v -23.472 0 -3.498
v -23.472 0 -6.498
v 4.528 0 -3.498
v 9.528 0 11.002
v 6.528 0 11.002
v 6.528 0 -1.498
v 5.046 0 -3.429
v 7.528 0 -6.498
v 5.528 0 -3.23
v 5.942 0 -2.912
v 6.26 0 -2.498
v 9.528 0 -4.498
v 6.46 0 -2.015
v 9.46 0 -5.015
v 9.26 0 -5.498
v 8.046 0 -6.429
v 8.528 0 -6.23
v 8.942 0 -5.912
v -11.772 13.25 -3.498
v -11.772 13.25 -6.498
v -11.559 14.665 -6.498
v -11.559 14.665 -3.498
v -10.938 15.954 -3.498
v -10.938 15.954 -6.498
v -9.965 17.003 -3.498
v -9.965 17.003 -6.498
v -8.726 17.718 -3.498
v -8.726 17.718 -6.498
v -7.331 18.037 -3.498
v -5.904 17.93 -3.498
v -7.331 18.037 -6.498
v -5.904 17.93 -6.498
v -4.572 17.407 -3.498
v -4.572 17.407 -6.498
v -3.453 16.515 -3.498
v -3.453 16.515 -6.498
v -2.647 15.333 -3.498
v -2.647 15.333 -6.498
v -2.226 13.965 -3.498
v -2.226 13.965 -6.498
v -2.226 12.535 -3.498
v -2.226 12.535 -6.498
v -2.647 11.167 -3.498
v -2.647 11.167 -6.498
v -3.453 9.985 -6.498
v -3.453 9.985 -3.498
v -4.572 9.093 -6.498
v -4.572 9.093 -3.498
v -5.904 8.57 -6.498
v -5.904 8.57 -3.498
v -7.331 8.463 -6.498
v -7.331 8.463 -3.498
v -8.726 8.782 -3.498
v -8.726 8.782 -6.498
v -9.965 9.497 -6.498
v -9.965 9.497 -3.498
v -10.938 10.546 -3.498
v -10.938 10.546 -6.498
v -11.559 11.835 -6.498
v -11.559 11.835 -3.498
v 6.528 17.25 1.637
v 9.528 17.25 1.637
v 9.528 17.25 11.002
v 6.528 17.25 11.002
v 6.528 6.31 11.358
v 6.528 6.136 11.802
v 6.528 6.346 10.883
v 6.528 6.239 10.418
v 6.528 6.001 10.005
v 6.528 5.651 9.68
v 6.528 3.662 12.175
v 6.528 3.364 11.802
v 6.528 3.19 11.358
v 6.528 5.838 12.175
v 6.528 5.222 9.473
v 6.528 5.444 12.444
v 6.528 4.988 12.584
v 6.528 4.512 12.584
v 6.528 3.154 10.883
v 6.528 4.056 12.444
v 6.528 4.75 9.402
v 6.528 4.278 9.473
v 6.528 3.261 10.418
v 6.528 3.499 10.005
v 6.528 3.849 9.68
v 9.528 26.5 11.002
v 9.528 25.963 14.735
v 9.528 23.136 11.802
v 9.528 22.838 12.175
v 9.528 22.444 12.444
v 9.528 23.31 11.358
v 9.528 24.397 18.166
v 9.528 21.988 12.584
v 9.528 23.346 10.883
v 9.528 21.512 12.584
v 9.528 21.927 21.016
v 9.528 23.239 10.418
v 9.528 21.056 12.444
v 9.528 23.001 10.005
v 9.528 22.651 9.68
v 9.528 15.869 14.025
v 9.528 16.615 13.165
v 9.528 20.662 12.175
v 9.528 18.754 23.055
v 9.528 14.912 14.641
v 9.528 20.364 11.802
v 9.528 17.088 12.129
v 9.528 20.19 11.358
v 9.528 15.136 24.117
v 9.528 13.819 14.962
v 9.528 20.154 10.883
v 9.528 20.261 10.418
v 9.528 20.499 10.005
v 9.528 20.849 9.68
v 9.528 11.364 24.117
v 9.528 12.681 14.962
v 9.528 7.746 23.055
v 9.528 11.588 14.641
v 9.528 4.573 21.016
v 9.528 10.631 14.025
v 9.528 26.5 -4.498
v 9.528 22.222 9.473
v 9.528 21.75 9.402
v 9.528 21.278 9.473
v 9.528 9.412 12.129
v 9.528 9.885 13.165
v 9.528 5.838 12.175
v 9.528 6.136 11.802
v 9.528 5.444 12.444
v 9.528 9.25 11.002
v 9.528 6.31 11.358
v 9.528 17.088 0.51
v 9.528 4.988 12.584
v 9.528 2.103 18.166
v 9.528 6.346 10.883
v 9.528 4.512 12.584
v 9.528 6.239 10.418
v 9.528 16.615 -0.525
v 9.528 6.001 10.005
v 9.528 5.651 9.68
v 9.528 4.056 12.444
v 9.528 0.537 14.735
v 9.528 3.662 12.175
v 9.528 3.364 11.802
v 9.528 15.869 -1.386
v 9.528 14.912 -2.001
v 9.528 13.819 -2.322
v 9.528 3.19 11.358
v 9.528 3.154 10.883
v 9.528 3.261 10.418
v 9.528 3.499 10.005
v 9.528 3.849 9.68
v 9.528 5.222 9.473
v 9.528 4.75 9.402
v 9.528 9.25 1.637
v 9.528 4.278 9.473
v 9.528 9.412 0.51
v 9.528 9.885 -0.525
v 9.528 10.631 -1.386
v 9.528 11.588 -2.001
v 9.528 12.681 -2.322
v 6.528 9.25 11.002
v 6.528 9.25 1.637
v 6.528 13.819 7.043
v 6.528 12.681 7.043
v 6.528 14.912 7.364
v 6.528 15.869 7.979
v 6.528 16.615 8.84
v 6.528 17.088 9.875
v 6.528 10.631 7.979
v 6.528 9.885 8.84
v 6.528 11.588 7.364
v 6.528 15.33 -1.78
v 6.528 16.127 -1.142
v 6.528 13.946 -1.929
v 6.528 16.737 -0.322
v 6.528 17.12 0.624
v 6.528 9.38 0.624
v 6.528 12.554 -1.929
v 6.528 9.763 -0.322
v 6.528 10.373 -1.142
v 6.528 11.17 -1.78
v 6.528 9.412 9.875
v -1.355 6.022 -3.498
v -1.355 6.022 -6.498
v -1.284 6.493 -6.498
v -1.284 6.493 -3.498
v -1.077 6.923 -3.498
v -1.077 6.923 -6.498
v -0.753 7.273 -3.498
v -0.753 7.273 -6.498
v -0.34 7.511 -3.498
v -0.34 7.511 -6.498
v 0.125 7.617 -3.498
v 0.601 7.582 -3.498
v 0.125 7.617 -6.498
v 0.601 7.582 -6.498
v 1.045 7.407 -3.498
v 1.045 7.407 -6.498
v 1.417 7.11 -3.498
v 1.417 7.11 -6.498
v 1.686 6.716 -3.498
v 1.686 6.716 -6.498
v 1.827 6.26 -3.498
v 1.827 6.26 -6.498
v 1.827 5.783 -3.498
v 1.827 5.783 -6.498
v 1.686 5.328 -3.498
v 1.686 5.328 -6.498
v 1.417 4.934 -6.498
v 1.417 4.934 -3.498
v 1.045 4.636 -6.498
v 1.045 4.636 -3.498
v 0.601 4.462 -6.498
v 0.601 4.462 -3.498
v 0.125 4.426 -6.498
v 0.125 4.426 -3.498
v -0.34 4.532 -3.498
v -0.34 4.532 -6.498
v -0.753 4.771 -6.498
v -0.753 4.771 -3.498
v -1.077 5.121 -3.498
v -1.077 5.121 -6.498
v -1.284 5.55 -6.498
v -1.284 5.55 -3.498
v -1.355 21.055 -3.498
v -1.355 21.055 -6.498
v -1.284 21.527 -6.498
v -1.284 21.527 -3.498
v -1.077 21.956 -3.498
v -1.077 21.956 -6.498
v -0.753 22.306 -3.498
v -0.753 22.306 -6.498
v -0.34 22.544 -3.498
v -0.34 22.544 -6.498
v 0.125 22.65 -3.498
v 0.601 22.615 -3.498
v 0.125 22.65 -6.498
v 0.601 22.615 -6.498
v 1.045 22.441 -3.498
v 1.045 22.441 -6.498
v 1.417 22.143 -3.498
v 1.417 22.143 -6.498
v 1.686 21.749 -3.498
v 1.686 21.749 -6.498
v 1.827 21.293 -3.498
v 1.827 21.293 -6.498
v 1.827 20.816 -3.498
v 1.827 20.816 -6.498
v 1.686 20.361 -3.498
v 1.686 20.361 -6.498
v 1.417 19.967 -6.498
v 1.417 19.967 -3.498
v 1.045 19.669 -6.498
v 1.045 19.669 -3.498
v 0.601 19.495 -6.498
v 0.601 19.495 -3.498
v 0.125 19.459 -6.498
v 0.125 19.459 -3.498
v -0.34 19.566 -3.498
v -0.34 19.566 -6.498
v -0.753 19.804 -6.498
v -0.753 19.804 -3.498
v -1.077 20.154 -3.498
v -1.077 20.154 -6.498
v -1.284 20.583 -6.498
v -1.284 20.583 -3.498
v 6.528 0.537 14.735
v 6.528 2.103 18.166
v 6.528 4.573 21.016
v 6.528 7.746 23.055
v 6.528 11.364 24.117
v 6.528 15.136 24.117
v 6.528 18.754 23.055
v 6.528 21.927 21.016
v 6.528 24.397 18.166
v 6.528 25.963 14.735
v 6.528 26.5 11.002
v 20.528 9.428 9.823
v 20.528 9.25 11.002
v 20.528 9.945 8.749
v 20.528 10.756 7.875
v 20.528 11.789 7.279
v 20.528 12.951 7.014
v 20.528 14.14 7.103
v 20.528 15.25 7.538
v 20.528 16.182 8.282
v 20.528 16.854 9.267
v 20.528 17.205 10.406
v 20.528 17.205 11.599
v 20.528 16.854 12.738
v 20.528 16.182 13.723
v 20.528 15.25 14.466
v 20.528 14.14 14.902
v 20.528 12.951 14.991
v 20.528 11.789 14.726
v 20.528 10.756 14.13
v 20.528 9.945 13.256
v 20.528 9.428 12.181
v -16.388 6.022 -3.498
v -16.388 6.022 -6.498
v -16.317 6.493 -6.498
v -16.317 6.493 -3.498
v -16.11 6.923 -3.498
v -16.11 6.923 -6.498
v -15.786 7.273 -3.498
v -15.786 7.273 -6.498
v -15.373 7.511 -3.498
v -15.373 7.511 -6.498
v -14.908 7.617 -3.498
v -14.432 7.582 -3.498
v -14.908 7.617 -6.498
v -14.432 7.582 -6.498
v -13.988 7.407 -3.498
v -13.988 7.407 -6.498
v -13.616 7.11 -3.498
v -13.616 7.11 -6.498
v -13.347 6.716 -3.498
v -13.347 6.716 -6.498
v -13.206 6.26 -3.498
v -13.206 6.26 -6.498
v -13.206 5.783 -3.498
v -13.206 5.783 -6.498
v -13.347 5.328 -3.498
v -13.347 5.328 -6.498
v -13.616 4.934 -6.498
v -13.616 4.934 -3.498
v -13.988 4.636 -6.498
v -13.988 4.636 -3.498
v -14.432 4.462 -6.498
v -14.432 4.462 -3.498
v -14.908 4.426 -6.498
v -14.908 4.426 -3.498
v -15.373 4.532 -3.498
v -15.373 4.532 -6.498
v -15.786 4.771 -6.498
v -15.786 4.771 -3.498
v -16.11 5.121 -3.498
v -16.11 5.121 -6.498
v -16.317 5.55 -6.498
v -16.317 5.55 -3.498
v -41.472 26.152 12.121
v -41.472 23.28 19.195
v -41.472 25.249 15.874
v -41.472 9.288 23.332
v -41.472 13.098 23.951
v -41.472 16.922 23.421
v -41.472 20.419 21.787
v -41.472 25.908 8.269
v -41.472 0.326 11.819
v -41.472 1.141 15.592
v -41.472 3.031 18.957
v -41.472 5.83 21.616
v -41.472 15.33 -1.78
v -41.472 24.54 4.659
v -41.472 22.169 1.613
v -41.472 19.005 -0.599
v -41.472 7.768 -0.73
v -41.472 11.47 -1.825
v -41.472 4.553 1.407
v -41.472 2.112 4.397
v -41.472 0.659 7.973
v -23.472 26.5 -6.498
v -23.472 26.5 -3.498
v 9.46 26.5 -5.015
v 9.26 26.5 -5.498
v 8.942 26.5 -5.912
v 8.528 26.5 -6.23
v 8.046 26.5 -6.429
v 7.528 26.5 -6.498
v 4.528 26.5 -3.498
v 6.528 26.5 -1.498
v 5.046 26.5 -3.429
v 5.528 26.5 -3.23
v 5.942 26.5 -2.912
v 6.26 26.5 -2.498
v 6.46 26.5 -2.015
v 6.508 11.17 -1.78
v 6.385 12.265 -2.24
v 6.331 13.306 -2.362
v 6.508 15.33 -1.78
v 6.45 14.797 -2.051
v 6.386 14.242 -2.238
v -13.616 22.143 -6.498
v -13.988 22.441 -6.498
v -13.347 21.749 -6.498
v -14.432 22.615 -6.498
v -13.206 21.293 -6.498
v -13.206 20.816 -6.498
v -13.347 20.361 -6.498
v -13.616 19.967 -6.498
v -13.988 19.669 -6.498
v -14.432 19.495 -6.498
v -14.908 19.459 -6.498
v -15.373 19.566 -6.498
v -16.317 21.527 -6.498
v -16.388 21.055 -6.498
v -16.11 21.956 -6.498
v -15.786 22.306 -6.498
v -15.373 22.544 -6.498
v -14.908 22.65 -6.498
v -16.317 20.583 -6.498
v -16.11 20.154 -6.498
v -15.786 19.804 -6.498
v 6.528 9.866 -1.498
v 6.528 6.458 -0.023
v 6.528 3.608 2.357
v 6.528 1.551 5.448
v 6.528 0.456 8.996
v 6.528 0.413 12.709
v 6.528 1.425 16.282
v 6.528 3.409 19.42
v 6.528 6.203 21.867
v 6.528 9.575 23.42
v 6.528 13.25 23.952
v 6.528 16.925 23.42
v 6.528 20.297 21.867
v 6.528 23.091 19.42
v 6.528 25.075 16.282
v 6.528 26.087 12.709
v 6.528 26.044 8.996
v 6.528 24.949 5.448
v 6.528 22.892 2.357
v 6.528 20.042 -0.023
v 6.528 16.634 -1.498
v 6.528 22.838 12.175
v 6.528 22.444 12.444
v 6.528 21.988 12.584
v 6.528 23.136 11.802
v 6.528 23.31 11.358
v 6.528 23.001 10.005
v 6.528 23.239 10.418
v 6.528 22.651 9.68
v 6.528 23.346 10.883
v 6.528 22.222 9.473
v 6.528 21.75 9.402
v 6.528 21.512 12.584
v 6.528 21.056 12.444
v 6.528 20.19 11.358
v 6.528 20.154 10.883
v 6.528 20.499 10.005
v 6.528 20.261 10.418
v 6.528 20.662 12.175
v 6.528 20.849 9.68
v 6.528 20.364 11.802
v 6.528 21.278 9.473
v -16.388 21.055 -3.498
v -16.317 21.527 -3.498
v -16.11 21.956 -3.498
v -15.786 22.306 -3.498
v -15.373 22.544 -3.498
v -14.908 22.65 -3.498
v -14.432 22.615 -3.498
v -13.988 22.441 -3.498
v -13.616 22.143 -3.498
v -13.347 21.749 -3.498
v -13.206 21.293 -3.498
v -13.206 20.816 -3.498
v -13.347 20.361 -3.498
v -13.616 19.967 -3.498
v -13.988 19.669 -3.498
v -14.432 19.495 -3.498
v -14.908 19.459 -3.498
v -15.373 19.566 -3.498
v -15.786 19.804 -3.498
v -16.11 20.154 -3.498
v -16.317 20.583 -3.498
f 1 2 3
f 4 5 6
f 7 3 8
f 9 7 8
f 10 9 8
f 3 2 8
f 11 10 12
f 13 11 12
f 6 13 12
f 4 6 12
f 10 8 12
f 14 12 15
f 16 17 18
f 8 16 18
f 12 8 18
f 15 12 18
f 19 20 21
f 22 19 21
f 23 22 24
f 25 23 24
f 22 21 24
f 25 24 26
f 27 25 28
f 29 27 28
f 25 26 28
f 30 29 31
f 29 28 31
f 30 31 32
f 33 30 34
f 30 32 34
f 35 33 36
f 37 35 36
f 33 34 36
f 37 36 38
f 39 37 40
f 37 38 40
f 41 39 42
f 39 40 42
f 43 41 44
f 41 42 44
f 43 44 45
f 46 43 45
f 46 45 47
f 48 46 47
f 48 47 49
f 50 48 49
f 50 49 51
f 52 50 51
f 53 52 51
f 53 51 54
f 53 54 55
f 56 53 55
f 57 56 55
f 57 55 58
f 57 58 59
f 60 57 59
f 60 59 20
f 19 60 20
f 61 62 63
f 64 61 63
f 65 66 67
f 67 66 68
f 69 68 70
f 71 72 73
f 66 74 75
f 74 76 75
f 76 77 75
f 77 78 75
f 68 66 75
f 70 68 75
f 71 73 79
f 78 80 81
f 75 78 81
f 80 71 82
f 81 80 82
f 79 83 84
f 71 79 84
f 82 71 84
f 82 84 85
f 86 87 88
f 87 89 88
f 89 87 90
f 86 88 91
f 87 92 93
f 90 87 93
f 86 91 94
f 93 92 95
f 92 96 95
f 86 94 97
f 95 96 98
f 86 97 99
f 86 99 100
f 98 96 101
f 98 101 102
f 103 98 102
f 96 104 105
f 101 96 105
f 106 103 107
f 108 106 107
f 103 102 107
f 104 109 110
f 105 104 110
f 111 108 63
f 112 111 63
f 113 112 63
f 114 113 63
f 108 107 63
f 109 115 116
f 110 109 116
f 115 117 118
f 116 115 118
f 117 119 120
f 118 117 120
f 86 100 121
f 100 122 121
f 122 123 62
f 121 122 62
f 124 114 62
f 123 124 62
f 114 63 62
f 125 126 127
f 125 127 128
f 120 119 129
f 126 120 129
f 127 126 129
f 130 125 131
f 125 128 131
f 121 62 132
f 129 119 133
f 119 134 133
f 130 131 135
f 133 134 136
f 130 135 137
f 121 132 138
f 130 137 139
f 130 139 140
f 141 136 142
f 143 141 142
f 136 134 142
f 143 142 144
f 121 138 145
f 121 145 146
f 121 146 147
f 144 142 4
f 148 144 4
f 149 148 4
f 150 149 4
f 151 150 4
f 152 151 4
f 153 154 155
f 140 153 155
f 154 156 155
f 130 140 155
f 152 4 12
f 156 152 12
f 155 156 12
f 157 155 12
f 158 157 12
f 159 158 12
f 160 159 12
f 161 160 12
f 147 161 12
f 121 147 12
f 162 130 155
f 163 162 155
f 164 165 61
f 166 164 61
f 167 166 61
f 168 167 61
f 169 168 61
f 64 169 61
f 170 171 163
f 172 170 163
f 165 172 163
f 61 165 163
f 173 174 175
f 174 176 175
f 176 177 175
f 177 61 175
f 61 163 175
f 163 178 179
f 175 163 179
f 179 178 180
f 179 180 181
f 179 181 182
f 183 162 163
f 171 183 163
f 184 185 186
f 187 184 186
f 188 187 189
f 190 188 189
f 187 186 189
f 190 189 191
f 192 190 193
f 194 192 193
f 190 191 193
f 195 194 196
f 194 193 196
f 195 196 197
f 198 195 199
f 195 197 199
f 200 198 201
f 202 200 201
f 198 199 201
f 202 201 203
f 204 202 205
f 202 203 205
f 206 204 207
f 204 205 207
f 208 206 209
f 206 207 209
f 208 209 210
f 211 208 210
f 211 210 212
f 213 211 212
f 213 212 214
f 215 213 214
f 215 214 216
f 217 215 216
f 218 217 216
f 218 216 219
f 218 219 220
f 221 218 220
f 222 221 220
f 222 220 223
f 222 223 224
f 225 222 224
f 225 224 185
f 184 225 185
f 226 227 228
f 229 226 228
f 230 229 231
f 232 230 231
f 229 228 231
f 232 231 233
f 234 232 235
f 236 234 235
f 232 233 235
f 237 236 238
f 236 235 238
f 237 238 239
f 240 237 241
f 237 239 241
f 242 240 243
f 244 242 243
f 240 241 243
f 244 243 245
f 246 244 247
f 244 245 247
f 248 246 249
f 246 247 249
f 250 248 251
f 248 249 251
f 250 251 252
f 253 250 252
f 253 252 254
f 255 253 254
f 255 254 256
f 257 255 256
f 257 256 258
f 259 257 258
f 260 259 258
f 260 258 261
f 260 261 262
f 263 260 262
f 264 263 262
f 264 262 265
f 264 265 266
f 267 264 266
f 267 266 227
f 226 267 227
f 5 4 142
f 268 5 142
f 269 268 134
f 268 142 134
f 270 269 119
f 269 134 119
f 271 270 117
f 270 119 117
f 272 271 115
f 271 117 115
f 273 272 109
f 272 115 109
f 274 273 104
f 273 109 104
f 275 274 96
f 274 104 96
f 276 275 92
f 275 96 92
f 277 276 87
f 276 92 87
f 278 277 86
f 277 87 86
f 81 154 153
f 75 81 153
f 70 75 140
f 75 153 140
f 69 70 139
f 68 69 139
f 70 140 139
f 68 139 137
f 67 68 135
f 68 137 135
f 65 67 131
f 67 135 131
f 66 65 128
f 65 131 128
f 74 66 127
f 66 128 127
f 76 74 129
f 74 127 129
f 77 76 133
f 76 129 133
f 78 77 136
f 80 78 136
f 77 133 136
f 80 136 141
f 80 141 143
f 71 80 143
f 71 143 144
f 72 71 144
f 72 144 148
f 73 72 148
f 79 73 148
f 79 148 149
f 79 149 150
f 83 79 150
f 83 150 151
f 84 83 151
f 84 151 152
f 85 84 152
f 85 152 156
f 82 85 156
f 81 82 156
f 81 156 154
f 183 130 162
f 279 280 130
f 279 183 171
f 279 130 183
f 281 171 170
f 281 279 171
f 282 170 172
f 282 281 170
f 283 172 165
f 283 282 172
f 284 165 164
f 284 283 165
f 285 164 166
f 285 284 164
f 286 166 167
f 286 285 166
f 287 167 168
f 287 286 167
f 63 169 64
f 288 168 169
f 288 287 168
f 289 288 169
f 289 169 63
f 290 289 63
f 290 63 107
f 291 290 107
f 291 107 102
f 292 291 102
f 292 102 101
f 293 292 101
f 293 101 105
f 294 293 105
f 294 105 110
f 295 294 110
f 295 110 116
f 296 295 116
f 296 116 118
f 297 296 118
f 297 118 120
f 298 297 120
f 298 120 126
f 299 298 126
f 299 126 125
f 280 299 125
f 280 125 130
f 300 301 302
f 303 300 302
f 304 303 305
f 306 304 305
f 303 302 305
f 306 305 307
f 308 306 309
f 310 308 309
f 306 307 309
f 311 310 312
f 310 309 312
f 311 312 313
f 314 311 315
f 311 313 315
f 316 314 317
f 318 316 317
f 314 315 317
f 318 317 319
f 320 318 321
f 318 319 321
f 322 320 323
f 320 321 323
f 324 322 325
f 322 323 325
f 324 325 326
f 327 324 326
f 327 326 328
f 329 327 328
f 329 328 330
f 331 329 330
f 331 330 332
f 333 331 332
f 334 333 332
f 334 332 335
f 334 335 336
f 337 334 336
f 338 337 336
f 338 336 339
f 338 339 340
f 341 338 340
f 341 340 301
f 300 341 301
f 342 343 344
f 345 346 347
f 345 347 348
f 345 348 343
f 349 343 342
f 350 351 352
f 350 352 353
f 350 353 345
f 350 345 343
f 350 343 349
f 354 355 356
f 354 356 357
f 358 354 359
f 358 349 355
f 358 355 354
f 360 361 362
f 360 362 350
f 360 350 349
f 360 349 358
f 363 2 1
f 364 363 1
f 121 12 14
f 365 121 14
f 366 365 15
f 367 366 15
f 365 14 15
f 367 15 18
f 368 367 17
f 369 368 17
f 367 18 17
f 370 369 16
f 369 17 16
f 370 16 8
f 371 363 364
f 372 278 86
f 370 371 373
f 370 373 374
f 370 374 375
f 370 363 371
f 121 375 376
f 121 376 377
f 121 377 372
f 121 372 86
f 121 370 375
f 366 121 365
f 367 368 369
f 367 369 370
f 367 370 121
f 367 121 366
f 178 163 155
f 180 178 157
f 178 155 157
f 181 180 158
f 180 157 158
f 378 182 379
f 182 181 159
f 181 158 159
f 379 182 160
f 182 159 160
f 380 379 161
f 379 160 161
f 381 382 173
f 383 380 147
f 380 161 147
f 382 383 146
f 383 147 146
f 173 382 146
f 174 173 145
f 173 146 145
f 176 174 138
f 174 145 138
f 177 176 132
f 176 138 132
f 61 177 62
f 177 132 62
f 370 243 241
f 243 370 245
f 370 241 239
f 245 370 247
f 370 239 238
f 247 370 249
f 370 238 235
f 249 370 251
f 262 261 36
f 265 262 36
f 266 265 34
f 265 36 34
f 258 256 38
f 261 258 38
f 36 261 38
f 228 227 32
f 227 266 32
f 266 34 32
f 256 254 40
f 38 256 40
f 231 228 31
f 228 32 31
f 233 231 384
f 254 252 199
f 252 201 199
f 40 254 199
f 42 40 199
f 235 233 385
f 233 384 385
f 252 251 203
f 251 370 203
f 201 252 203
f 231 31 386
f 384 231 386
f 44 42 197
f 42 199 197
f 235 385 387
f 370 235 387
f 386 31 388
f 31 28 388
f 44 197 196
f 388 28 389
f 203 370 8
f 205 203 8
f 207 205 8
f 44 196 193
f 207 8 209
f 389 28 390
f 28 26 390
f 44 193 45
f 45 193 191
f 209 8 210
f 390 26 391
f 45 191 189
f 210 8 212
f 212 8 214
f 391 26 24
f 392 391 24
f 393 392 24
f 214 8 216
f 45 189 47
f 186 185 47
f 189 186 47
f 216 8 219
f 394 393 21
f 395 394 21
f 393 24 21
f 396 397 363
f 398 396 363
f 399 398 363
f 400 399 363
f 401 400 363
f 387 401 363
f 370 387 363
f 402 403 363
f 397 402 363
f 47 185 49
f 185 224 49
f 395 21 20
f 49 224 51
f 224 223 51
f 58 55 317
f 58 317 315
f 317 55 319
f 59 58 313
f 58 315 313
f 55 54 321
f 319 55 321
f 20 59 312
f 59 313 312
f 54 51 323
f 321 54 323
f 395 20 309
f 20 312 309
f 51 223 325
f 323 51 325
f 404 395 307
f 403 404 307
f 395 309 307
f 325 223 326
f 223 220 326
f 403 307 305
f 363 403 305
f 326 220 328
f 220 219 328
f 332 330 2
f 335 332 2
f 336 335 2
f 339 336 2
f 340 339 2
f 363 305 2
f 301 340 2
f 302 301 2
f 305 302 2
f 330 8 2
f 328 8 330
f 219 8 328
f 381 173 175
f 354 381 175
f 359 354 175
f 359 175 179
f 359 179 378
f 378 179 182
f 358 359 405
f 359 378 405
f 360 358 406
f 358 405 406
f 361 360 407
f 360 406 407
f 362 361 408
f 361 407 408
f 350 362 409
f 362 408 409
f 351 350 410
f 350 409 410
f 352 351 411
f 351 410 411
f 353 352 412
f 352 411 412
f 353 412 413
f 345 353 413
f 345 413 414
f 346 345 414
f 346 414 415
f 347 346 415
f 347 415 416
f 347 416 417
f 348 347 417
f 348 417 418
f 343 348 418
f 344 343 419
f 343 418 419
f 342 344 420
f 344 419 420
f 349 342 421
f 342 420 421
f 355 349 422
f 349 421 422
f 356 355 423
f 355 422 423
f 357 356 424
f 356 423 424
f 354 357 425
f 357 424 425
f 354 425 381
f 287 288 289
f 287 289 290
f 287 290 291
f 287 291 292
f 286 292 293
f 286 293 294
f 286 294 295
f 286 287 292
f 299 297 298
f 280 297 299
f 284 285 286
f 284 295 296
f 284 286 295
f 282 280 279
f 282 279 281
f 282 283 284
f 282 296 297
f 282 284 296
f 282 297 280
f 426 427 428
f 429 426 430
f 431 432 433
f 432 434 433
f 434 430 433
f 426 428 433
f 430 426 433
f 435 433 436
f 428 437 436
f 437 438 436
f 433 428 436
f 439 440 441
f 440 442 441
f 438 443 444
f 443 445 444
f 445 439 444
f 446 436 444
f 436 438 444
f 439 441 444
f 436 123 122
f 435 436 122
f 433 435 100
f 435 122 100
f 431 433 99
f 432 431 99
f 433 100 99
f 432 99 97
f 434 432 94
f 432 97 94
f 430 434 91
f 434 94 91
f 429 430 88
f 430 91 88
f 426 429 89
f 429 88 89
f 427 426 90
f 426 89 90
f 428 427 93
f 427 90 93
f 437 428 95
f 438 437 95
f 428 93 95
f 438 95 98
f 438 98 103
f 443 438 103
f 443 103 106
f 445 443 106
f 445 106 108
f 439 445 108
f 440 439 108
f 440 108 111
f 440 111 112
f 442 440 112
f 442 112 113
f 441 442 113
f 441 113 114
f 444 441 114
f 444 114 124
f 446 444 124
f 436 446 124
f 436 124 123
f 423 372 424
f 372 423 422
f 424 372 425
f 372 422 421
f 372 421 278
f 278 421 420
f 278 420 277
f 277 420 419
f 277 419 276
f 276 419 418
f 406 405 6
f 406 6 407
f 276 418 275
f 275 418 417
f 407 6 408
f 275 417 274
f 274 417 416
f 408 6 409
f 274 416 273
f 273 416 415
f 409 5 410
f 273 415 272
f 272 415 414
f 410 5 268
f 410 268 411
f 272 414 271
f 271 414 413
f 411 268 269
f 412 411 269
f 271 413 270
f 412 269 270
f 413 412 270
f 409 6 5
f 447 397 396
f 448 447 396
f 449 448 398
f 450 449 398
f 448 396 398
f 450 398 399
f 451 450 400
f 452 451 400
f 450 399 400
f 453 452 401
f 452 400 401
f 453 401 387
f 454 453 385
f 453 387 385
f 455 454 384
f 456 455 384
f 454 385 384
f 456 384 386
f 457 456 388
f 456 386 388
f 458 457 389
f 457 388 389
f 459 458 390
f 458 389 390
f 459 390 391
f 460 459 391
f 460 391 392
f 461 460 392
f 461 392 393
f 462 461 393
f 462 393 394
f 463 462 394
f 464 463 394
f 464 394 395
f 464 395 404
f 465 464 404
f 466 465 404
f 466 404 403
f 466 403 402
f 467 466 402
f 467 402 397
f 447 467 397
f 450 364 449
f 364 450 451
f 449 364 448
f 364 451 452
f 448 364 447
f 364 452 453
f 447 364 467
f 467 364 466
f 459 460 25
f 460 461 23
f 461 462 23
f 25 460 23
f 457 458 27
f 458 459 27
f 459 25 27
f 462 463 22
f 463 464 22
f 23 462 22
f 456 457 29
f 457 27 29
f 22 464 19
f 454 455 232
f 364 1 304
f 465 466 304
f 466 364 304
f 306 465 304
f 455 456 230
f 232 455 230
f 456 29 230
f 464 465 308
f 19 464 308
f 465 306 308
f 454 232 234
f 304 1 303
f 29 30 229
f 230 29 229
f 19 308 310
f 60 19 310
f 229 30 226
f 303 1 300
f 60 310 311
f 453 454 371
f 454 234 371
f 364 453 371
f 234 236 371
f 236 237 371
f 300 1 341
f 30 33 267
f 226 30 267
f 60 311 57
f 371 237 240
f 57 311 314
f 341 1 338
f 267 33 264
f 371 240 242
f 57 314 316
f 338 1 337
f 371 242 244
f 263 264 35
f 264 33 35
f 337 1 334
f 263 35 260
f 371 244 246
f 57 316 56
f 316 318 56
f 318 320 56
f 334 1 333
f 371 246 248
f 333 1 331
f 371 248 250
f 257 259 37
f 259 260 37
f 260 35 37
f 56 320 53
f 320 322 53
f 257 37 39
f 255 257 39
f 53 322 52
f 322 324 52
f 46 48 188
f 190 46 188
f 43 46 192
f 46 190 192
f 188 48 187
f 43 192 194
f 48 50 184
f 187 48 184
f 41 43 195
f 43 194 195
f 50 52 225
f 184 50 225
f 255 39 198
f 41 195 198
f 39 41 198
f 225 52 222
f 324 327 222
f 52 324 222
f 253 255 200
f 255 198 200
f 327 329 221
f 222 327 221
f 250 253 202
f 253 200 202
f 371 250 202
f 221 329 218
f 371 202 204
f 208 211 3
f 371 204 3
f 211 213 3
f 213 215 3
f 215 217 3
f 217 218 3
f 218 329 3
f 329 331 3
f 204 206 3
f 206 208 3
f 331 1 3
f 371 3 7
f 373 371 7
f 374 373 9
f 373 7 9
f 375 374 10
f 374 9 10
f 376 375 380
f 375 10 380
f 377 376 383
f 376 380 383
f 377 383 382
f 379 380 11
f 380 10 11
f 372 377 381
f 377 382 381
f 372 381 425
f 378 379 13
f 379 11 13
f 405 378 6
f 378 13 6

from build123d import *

# Parameters (mm, degrees)
EXTRUDE_1_DEPTH     = 26.5
SKETCH_4_R          = 4.8
SKETCH_4_R_2        = 1.6
CUT_EXTRUDE_1_DEPTH = 26
SKETCH_5_R          = 1.6
CUT_EXTRUDE_2_DEPTH = 26
SKETCH_6_R          = 12.95
EXTRUDE_2_DEPTH     = 48
EXTRUDE_START       = 14
SKETCH_7_R          = 4
EXTRUDE_3_DEPTH     = 14


with BuildPart() as part:
    # 草图2 → 凸台-拉伸1 (new body)
    with BuildSketch(Plane(origin=(0, 0, 0), x_dir=(1, 0, 0), z_dir=(0, 1, 0))):
        with BuildLine():
            Line((-23.472034258, 6.497634693), (-23.472034258, 3.497634693))
            Line((-23.472034258, 3.497634693), (4.527965742, 3.497634693))
            ThreePointArc((4.527965742, 3.497634693), (5.942179305, 2.911848255), (6.527965742, 1.497634693))
            Line((6.527965742, 1.497634693), (6.527965742, -26.502365307))
            Line((6.527965742, -26.502365307), (9.527965742, -26.502365307))
            Line((9.527965742, -26.502365307), (9.527965742, 4.497634693))
            ThreePointArc((9.527965742, 4.497634693), (8.942179305, 5.911848255), (7.527965742, 6.497634693))
            Line((7.527965742, 6.497634693), (-23.472034258, 6.497634693))
        make_face()
    extrude(amount=EXTRUDE_1_DEPTH)

    # 草图4 → 切除-拉伸1 (cut)
    with BuildSketch(Plane(origin=(0, 0, -6.497634693), x_dir=(-1, 0, 0), z_dir=(0, 0, -1))):
        with Locations((6.972034258, 13.25)):
            Circle(SKETCH_4_R)
        with Locations((-0.244612027, 21.054928982)):
            Circle(SKETCH_4_R_2)
        with Locations((14.788478141, 21.054928982)):
            Circle(SKETCH_4_R_2)
        with Locations((14.788478141, 6.021838814)):
            Circle(SKETCH_4_R_2)
        with Locations((-0.244612027, 6.021838814)):
            Circle(SKETCH_4_R_2)
    extrude(amount=-CUT_EXTRUDE_1_DEPTH, mode=Mode.SUBTRACT)

    # 草图5 → 切除-拉伸2 (cut)
    with BuildSketch(Plane(origin=(9.527965742, 0, 0), x_dir=(0, 0, -1), z_dir=(1, 0, 0))):
        with BuildLine():
            Line((-26.502365307, 26.5), (-26.502365307, 0))
            Line((-26.502365307, 0), (-11.002365307, 0))
            ThreePointArc((-11.002365307, 0), (-24.252365307, 13.25), (-11.002365307, 26.5))
            Line((-11.002365307, 26.5), (-26.502365307, 26.5))
        make_face()
        with BuildLine():
            Line((-11.002365307, 9.25), (-1.637230429, 9.25))
            ThreePointArc((-1.637230429, 9.25), (2.362769571, 13.25), (-1.637230429, 17.25))
            Line((-1.637230429, 17.25), (-11.002365307, 17.25))
            ThreePointArc((-11.002365307, 17.25), (-15.002365307, 13.25), (-11.002365307, 9.25))
        make_face()
        with Locations((-11.002365307, 4.75)):
            Circle(SKETCH_5_R)
        with Locations((-11.002365307, 21.75)):
            Circle(SKETCH_5_R)
    extrude(amount=-CUT_EXTRUDE_2_DEPTH, mode=Mode.SUBTRACT)

    # 草图6 → 凸台-拉伸2 (add)
    with BuildSketch(Plane.ZY.offset(-6.527965742)):
        with Locations(Location((11.002365307, 13.25, 0), (0, 0, 170.757909694))):
            Circle(SKETCH_6_R)
    extrude(amount=EXTRUDE_2_DEPTH)

    # 草图7 → 凸台-拉伸3 (add)
    with BuildSketch(Plane(origin=(6.527965742, 0, 0), x_dir=(0, 0, -1), z_dir=(1, 0, 0)).offset(EXTRUDE_START)):
        with Locations(Location((-11.002365307, 13.25, 0), (0, 0, 270))):
            Circle(SKETCH_7_R)
    extrude(amount=-EXTRUDE_3_DEPTH)


solid = part.part
